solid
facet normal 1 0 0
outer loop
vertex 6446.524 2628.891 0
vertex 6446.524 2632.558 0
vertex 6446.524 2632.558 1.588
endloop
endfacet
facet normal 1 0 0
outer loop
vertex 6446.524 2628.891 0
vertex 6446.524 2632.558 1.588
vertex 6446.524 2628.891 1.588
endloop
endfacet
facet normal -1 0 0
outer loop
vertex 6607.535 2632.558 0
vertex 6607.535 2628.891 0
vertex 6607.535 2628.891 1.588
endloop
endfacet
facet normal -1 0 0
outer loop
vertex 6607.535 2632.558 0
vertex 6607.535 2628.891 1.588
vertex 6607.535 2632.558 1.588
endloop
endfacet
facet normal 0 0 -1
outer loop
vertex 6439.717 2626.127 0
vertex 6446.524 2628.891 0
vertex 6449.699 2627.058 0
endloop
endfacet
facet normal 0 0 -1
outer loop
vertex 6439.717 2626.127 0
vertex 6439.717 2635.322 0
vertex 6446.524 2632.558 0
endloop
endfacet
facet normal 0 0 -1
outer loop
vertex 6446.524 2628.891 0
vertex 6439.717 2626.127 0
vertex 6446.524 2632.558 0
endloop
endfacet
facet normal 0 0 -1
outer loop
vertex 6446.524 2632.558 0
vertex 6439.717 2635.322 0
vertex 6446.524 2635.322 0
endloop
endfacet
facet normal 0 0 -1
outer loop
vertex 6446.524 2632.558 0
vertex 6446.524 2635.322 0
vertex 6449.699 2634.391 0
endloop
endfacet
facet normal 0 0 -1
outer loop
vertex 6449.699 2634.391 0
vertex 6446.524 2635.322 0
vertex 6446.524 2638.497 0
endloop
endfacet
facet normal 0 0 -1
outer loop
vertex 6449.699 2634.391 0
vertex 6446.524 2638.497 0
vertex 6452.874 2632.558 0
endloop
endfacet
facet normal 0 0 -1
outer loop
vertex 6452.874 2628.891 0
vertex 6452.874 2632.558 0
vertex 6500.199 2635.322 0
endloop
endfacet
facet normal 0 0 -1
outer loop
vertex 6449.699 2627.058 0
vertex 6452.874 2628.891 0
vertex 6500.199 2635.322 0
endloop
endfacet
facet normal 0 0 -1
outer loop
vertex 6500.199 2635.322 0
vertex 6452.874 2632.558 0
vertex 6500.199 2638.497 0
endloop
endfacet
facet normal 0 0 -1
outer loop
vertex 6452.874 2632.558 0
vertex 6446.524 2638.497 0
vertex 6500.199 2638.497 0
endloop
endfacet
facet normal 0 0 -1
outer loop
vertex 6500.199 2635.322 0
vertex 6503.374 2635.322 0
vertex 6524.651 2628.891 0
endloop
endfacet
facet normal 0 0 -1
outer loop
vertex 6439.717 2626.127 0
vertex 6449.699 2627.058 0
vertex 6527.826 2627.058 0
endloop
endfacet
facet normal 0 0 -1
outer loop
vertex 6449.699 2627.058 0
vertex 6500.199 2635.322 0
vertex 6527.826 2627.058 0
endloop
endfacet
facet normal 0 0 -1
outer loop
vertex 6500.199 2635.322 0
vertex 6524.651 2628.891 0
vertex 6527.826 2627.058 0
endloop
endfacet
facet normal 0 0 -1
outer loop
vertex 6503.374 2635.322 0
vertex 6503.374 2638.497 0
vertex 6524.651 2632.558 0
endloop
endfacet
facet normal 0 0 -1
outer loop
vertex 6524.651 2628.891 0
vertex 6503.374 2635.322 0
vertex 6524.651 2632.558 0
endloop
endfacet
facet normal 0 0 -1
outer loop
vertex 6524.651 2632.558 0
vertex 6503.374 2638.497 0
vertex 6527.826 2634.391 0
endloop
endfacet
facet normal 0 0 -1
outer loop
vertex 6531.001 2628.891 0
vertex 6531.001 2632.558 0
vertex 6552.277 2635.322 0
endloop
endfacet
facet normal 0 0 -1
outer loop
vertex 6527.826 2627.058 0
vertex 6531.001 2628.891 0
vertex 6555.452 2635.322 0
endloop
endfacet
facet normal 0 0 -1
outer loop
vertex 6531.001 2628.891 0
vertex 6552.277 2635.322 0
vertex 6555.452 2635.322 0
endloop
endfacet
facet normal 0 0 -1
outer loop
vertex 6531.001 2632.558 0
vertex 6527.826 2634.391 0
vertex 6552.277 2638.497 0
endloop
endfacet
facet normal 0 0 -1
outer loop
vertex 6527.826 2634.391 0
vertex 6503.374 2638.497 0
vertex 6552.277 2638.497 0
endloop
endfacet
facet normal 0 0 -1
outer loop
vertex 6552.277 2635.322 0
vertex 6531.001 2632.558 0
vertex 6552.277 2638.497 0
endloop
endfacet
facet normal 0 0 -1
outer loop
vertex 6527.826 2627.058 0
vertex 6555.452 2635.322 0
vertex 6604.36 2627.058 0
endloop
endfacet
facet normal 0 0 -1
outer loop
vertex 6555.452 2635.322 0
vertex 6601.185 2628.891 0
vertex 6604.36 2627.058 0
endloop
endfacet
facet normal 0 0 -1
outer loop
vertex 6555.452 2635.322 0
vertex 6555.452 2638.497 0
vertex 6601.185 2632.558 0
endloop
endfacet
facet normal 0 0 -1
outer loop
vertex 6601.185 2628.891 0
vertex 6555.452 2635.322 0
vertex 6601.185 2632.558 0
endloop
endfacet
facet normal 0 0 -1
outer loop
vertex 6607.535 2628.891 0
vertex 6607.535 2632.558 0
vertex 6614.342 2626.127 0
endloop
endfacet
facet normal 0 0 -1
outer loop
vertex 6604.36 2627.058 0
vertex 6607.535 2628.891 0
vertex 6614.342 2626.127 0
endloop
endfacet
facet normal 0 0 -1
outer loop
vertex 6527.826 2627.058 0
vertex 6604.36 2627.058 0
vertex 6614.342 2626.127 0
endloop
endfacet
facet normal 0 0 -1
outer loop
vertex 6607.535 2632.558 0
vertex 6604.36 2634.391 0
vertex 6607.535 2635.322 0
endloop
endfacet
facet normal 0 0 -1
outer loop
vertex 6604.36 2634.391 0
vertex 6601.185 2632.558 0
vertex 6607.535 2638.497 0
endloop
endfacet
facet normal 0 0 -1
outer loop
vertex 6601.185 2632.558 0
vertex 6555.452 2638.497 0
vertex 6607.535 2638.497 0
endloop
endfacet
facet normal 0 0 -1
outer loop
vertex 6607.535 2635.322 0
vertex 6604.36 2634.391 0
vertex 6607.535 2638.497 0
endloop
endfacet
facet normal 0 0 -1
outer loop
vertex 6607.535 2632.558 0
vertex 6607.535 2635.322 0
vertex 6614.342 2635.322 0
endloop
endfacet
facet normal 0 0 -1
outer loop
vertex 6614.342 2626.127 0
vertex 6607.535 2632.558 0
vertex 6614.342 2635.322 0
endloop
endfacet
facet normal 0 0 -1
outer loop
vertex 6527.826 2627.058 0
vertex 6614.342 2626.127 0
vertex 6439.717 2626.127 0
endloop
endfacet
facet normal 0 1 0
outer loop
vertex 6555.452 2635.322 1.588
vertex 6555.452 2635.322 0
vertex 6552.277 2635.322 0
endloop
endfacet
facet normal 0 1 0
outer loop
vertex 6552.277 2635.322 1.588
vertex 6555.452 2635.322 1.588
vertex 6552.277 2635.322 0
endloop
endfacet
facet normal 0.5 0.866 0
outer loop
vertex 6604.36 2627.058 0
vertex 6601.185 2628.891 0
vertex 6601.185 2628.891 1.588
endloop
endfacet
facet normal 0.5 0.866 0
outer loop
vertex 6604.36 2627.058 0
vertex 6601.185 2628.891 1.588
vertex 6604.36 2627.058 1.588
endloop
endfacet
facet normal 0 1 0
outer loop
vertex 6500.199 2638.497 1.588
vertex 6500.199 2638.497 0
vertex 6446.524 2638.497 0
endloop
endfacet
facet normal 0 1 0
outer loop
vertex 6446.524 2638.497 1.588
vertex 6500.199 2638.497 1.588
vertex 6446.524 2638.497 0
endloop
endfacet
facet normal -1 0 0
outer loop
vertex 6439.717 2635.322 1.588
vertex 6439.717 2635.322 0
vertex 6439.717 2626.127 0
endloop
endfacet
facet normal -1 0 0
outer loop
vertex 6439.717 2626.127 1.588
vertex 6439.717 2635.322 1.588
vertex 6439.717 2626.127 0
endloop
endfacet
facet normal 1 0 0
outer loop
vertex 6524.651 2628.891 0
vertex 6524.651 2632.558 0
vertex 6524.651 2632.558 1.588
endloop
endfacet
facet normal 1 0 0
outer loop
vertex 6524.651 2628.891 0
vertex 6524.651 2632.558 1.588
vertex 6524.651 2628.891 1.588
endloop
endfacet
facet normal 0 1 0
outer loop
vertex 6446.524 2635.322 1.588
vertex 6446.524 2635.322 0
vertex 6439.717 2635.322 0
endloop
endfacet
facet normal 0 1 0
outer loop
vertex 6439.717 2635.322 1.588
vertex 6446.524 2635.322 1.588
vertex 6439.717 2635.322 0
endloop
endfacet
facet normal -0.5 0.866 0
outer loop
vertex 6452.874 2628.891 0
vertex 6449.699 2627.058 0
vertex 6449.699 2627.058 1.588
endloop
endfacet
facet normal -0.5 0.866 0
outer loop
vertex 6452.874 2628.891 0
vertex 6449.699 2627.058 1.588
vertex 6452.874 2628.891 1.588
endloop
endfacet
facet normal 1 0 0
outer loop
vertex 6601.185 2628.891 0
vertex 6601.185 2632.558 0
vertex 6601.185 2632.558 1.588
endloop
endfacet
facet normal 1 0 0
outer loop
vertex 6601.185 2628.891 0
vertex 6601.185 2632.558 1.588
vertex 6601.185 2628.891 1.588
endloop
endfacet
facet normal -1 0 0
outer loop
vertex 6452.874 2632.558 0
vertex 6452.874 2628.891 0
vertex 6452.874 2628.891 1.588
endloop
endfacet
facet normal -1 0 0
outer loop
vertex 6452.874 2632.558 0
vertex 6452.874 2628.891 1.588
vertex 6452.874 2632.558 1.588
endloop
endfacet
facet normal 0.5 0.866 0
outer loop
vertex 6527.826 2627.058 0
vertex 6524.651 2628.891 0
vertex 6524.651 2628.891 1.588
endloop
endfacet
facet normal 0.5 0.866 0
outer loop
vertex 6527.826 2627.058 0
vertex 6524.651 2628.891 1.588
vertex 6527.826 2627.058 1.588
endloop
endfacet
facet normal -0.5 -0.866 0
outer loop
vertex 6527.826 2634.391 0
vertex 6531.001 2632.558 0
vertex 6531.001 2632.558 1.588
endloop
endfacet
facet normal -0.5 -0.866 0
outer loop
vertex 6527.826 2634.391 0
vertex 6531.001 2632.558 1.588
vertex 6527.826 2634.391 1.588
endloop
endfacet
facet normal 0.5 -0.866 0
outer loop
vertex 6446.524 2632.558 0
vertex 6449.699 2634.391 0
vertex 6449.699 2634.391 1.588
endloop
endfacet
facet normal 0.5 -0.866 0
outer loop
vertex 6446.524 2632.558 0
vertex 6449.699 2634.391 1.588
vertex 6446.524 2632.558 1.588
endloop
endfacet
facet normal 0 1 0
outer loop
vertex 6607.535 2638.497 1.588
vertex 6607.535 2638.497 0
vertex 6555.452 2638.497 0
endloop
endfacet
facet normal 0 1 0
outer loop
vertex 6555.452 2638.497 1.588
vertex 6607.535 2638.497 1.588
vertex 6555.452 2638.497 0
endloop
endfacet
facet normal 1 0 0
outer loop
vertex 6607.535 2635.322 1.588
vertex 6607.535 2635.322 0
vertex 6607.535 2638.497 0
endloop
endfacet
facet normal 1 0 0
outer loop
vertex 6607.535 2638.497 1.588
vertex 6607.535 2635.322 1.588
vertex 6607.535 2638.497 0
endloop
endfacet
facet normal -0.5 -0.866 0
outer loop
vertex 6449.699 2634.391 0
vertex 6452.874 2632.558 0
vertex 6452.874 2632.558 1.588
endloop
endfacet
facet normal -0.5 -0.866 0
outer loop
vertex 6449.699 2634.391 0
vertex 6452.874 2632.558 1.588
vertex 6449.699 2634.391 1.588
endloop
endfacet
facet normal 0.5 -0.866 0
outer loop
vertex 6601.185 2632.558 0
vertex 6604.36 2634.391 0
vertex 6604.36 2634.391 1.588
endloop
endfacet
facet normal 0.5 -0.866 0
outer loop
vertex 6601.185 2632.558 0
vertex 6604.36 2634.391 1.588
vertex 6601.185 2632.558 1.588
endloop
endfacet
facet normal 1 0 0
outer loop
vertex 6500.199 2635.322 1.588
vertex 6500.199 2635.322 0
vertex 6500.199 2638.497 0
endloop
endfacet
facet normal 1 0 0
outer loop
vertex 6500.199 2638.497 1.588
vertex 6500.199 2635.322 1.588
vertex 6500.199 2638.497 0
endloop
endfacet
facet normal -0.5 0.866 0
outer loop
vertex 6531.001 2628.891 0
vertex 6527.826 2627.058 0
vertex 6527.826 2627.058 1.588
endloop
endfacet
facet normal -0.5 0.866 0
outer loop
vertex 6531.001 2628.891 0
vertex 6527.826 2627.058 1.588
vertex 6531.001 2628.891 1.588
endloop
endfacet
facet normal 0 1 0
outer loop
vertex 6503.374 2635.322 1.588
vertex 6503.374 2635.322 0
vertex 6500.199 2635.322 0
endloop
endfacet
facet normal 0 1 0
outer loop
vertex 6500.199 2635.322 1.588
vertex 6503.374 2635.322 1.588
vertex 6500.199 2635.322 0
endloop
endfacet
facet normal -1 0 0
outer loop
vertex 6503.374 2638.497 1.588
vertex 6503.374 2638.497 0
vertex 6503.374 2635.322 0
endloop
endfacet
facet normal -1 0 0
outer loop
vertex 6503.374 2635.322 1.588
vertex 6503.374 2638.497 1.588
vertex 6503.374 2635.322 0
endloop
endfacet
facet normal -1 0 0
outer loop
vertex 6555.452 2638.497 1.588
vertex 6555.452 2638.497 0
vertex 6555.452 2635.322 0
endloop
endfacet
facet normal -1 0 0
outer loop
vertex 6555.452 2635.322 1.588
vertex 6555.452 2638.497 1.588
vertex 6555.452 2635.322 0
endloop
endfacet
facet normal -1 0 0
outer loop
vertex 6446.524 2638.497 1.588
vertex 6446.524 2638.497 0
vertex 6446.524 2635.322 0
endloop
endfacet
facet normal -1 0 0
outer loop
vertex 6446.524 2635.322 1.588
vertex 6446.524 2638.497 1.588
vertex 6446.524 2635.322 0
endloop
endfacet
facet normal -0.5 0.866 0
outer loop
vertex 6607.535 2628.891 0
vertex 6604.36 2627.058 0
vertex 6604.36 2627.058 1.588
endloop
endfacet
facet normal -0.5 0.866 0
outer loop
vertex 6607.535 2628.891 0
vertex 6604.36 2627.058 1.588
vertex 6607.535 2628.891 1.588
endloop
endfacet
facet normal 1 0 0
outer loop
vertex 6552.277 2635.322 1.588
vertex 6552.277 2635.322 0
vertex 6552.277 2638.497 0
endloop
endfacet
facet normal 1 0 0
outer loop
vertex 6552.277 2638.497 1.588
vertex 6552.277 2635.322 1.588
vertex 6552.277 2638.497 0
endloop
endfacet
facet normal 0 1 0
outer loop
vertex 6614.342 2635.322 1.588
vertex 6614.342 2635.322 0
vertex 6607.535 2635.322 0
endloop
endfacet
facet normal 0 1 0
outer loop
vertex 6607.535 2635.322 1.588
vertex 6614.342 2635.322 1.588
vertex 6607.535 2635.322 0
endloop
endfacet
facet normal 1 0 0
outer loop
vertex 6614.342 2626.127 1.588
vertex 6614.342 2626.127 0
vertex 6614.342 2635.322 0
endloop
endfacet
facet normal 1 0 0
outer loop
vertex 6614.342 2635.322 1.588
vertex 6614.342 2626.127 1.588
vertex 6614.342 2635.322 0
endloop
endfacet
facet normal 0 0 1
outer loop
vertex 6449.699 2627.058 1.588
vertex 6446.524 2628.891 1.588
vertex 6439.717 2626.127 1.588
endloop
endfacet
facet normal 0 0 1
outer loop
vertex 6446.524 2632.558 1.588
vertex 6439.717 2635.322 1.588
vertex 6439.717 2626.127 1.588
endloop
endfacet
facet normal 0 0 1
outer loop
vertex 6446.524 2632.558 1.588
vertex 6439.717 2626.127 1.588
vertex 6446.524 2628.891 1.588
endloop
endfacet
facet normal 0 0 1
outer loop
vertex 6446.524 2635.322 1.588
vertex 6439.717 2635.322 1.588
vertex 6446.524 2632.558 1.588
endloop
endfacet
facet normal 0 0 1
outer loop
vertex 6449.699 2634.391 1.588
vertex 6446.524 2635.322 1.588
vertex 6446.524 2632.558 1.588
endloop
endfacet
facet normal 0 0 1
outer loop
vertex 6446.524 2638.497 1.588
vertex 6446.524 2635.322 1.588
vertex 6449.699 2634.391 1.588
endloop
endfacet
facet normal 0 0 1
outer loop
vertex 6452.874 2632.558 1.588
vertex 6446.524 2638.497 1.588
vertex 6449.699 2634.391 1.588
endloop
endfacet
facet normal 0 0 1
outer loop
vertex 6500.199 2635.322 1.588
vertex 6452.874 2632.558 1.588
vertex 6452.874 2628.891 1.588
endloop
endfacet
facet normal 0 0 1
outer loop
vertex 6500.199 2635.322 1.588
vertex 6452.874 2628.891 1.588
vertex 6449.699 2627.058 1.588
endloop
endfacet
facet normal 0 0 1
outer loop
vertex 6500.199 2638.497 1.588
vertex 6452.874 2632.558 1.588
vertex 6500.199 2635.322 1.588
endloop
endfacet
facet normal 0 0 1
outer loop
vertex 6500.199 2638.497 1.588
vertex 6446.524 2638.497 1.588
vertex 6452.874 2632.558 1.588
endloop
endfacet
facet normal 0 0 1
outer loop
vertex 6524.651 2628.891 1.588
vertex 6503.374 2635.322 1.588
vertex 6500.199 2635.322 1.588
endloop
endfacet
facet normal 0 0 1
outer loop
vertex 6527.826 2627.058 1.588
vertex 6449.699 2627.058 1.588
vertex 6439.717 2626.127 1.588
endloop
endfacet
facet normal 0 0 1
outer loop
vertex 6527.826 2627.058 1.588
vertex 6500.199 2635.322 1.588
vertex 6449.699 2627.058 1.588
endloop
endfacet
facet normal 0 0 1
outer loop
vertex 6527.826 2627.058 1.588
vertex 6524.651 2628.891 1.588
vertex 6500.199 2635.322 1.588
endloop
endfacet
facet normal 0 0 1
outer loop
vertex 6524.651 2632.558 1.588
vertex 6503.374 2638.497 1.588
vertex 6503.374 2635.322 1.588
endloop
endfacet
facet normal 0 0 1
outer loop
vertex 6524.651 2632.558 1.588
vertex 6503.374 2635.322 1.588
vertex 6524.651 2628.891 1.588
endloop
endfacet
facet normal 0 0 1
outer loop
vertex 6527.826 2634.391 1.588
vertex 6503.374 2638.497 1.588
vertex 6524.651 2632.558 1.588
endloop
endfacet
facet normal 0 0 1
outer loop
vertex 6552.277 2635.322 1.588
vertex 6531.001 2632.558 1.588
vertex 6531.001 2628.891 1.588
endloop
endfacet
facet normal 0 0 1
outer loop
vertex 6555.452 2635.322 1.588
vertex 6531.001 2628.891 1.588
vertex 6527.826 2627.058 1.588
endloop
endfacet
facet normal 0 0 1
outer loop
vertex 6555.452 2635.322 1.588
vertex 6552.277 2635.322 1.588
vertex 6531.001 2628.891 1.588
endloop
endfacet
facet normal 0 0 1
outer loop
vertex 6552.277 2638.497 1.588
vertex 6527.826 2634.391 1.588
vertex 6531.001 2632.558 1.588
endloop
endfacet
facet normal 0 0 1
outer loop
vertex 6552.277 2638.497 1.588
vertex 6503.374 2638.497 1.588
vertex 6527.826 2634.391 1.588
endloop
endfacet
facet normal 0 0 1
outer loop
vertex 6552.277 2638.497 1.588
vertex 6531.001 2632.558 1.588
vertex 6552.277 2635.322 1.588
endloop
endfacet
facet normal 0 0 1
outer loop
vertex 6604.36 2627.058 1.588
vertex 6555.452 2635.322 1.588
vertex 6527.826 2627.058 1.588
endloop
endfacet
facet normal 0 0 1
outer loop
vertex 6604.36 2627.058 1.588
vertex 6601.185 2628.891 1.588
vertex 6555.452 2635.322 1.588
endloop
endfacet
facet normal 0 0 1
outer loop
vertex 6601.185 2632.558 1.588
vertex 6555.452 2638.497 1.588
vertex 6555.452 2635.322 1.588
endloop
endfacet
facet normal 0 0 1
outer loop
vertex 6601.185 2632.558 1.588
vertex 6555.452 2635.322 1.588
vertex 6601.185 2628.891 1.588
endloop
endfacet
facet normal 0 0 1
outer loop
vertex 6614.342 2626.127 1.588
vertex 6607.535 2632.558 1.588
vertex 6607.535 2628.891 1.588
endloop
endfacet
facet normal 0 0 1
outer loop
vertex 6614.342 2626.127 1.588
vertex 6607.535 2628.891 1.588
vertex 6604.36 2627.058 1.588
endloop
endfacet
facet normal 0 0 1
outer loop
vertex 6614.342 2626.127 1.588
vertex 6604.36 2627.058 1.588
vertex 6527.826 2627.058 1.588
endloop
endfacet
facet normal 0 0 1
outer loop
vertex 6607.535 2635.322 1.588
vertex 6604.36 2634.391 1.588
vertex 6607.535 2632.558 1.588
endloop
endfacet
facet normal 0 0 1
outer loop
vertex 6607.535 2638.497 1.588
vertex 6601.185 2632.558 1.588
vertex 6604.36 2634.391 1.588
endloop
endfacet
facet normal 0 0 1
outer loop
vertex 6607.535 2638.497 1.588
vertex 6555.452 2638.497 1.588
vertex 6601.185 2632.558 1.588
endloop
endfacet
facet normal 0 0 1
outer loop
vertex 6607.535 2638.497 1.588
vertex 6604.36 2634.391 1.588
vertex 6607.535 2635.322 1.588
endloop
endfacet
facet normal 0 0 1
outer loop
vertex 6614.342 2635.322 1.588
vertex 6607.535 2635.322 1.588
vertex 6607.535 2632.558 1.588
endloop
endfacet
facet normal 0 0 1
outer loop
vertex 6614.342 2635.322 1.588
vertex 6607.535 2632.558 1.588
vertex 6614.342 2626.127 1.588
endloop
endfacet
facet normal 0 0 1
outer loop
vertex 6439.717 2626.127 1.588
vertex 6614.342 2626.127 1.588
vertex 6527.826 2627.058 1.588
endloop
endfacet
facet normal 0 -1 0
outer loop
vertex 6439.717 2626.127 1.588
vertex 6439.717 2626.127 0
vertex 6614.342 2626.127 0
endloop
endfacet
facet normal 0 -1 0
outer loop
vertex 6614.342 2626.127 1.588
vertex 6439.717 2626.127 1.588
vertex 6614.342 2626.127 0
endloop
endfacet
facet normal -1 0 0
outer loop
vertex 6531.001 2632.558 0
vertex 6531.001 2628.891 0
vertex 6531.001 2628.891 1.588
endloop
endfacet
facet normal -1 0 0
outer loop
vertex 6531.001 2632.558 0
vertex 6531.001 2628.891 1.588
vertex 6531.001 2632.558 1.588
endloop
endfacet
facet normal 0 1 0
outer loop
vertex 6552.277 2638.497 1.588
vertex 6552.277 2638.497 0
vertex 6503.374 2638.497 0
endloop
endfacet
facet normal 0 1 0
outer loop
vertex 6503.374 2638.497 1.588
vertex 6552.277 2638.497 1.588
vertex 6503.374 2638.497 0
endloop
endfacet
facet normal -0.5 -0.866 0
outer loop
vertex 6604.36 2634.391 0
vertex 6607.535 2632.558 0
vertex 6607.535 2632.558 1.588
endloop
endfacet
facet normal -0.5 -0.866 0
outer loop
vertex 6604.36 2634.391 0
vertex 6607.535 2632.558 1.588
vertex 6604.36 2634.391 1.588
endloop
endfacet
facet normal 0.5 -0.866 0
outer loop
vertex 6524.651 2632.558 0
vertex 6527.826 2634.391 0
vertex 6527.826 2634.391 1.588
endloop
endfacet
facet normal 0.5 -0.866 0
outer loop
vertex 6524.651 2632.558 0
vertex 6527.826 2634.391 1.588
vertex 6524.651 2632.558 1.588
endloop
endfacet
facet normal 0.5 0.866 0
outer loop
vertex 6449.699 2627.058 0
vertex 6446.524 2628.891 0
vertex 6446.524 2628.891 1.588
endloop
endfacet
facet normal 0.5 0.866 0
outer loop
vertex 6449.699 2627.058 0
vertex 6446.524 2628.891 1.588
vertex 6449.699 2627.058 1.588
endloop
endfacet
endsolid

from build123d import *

# Parameters (mm, degrees)
BOSS_EXTRUDE1_DEPTH = 1.5875


with BuildPart() as part:
    # Sketch1 → Boss-Extrude1 (new body)
    with BuildSketch(Plane.XY):
        Polygon((6607.534727104, 2635.321979213), (6607.534727104, 2638.496979213), (6555.452027104, 2638.496979213), (6555.452027104, 2635.321979213), (6552.277027104, 2635.321979213), (6552.277027104, 2638.496979213), (6503.374423235, 2638.496979213), (6503.374423235, 2635.321979213), (6500.199423235, 2635.321979213), (6500.199423235, 2638.496979213), (6446.524127104, 2638.496979213), (6446.524127104, 2635.321979213), (6439.716927104, 2635.321979213), (6439.716927104, 2626.127179213), (6614.341927104, 2626.127179213), (6614.341927104, 2635.321979213), align=None)
        Polygon((6531.000725169, 2632.557666317), (6527.825725169, 2634.390753422), (6524.650725169, 2632.557666317), (6524.650725169, 2628.891492108), (6527.825725169, 2627.058405003), (6531.000725169, 2628.891492108), align=None, mode=Mode.SUBTRACT)
        Polygon((6452.874127104, 2632.557666317), (6449.699127104, 2634.390753422), (6446.524127104, 2632.557666317), (6446.524127104, 2628.891492108), (6449.699127104, 2627.058405003), (6452.874127104, 2628.891492108), align=None, mode=Mode.SUBTRACT)
        Polygon((6607.534727104, 2632.557666317), (6604.359727104, 2634.390753422), (6601.184727104, 2632.557666317), (6601.184727104, 2628.891492108), (6604.359727104, 2627.058405003), (6607.534727104, 2628.891492108), align=None, mode=Mode.SUBTRACT)
    extrude(amount=BOSS_EXTRUDE1_DEPTH)


solid = part.part
